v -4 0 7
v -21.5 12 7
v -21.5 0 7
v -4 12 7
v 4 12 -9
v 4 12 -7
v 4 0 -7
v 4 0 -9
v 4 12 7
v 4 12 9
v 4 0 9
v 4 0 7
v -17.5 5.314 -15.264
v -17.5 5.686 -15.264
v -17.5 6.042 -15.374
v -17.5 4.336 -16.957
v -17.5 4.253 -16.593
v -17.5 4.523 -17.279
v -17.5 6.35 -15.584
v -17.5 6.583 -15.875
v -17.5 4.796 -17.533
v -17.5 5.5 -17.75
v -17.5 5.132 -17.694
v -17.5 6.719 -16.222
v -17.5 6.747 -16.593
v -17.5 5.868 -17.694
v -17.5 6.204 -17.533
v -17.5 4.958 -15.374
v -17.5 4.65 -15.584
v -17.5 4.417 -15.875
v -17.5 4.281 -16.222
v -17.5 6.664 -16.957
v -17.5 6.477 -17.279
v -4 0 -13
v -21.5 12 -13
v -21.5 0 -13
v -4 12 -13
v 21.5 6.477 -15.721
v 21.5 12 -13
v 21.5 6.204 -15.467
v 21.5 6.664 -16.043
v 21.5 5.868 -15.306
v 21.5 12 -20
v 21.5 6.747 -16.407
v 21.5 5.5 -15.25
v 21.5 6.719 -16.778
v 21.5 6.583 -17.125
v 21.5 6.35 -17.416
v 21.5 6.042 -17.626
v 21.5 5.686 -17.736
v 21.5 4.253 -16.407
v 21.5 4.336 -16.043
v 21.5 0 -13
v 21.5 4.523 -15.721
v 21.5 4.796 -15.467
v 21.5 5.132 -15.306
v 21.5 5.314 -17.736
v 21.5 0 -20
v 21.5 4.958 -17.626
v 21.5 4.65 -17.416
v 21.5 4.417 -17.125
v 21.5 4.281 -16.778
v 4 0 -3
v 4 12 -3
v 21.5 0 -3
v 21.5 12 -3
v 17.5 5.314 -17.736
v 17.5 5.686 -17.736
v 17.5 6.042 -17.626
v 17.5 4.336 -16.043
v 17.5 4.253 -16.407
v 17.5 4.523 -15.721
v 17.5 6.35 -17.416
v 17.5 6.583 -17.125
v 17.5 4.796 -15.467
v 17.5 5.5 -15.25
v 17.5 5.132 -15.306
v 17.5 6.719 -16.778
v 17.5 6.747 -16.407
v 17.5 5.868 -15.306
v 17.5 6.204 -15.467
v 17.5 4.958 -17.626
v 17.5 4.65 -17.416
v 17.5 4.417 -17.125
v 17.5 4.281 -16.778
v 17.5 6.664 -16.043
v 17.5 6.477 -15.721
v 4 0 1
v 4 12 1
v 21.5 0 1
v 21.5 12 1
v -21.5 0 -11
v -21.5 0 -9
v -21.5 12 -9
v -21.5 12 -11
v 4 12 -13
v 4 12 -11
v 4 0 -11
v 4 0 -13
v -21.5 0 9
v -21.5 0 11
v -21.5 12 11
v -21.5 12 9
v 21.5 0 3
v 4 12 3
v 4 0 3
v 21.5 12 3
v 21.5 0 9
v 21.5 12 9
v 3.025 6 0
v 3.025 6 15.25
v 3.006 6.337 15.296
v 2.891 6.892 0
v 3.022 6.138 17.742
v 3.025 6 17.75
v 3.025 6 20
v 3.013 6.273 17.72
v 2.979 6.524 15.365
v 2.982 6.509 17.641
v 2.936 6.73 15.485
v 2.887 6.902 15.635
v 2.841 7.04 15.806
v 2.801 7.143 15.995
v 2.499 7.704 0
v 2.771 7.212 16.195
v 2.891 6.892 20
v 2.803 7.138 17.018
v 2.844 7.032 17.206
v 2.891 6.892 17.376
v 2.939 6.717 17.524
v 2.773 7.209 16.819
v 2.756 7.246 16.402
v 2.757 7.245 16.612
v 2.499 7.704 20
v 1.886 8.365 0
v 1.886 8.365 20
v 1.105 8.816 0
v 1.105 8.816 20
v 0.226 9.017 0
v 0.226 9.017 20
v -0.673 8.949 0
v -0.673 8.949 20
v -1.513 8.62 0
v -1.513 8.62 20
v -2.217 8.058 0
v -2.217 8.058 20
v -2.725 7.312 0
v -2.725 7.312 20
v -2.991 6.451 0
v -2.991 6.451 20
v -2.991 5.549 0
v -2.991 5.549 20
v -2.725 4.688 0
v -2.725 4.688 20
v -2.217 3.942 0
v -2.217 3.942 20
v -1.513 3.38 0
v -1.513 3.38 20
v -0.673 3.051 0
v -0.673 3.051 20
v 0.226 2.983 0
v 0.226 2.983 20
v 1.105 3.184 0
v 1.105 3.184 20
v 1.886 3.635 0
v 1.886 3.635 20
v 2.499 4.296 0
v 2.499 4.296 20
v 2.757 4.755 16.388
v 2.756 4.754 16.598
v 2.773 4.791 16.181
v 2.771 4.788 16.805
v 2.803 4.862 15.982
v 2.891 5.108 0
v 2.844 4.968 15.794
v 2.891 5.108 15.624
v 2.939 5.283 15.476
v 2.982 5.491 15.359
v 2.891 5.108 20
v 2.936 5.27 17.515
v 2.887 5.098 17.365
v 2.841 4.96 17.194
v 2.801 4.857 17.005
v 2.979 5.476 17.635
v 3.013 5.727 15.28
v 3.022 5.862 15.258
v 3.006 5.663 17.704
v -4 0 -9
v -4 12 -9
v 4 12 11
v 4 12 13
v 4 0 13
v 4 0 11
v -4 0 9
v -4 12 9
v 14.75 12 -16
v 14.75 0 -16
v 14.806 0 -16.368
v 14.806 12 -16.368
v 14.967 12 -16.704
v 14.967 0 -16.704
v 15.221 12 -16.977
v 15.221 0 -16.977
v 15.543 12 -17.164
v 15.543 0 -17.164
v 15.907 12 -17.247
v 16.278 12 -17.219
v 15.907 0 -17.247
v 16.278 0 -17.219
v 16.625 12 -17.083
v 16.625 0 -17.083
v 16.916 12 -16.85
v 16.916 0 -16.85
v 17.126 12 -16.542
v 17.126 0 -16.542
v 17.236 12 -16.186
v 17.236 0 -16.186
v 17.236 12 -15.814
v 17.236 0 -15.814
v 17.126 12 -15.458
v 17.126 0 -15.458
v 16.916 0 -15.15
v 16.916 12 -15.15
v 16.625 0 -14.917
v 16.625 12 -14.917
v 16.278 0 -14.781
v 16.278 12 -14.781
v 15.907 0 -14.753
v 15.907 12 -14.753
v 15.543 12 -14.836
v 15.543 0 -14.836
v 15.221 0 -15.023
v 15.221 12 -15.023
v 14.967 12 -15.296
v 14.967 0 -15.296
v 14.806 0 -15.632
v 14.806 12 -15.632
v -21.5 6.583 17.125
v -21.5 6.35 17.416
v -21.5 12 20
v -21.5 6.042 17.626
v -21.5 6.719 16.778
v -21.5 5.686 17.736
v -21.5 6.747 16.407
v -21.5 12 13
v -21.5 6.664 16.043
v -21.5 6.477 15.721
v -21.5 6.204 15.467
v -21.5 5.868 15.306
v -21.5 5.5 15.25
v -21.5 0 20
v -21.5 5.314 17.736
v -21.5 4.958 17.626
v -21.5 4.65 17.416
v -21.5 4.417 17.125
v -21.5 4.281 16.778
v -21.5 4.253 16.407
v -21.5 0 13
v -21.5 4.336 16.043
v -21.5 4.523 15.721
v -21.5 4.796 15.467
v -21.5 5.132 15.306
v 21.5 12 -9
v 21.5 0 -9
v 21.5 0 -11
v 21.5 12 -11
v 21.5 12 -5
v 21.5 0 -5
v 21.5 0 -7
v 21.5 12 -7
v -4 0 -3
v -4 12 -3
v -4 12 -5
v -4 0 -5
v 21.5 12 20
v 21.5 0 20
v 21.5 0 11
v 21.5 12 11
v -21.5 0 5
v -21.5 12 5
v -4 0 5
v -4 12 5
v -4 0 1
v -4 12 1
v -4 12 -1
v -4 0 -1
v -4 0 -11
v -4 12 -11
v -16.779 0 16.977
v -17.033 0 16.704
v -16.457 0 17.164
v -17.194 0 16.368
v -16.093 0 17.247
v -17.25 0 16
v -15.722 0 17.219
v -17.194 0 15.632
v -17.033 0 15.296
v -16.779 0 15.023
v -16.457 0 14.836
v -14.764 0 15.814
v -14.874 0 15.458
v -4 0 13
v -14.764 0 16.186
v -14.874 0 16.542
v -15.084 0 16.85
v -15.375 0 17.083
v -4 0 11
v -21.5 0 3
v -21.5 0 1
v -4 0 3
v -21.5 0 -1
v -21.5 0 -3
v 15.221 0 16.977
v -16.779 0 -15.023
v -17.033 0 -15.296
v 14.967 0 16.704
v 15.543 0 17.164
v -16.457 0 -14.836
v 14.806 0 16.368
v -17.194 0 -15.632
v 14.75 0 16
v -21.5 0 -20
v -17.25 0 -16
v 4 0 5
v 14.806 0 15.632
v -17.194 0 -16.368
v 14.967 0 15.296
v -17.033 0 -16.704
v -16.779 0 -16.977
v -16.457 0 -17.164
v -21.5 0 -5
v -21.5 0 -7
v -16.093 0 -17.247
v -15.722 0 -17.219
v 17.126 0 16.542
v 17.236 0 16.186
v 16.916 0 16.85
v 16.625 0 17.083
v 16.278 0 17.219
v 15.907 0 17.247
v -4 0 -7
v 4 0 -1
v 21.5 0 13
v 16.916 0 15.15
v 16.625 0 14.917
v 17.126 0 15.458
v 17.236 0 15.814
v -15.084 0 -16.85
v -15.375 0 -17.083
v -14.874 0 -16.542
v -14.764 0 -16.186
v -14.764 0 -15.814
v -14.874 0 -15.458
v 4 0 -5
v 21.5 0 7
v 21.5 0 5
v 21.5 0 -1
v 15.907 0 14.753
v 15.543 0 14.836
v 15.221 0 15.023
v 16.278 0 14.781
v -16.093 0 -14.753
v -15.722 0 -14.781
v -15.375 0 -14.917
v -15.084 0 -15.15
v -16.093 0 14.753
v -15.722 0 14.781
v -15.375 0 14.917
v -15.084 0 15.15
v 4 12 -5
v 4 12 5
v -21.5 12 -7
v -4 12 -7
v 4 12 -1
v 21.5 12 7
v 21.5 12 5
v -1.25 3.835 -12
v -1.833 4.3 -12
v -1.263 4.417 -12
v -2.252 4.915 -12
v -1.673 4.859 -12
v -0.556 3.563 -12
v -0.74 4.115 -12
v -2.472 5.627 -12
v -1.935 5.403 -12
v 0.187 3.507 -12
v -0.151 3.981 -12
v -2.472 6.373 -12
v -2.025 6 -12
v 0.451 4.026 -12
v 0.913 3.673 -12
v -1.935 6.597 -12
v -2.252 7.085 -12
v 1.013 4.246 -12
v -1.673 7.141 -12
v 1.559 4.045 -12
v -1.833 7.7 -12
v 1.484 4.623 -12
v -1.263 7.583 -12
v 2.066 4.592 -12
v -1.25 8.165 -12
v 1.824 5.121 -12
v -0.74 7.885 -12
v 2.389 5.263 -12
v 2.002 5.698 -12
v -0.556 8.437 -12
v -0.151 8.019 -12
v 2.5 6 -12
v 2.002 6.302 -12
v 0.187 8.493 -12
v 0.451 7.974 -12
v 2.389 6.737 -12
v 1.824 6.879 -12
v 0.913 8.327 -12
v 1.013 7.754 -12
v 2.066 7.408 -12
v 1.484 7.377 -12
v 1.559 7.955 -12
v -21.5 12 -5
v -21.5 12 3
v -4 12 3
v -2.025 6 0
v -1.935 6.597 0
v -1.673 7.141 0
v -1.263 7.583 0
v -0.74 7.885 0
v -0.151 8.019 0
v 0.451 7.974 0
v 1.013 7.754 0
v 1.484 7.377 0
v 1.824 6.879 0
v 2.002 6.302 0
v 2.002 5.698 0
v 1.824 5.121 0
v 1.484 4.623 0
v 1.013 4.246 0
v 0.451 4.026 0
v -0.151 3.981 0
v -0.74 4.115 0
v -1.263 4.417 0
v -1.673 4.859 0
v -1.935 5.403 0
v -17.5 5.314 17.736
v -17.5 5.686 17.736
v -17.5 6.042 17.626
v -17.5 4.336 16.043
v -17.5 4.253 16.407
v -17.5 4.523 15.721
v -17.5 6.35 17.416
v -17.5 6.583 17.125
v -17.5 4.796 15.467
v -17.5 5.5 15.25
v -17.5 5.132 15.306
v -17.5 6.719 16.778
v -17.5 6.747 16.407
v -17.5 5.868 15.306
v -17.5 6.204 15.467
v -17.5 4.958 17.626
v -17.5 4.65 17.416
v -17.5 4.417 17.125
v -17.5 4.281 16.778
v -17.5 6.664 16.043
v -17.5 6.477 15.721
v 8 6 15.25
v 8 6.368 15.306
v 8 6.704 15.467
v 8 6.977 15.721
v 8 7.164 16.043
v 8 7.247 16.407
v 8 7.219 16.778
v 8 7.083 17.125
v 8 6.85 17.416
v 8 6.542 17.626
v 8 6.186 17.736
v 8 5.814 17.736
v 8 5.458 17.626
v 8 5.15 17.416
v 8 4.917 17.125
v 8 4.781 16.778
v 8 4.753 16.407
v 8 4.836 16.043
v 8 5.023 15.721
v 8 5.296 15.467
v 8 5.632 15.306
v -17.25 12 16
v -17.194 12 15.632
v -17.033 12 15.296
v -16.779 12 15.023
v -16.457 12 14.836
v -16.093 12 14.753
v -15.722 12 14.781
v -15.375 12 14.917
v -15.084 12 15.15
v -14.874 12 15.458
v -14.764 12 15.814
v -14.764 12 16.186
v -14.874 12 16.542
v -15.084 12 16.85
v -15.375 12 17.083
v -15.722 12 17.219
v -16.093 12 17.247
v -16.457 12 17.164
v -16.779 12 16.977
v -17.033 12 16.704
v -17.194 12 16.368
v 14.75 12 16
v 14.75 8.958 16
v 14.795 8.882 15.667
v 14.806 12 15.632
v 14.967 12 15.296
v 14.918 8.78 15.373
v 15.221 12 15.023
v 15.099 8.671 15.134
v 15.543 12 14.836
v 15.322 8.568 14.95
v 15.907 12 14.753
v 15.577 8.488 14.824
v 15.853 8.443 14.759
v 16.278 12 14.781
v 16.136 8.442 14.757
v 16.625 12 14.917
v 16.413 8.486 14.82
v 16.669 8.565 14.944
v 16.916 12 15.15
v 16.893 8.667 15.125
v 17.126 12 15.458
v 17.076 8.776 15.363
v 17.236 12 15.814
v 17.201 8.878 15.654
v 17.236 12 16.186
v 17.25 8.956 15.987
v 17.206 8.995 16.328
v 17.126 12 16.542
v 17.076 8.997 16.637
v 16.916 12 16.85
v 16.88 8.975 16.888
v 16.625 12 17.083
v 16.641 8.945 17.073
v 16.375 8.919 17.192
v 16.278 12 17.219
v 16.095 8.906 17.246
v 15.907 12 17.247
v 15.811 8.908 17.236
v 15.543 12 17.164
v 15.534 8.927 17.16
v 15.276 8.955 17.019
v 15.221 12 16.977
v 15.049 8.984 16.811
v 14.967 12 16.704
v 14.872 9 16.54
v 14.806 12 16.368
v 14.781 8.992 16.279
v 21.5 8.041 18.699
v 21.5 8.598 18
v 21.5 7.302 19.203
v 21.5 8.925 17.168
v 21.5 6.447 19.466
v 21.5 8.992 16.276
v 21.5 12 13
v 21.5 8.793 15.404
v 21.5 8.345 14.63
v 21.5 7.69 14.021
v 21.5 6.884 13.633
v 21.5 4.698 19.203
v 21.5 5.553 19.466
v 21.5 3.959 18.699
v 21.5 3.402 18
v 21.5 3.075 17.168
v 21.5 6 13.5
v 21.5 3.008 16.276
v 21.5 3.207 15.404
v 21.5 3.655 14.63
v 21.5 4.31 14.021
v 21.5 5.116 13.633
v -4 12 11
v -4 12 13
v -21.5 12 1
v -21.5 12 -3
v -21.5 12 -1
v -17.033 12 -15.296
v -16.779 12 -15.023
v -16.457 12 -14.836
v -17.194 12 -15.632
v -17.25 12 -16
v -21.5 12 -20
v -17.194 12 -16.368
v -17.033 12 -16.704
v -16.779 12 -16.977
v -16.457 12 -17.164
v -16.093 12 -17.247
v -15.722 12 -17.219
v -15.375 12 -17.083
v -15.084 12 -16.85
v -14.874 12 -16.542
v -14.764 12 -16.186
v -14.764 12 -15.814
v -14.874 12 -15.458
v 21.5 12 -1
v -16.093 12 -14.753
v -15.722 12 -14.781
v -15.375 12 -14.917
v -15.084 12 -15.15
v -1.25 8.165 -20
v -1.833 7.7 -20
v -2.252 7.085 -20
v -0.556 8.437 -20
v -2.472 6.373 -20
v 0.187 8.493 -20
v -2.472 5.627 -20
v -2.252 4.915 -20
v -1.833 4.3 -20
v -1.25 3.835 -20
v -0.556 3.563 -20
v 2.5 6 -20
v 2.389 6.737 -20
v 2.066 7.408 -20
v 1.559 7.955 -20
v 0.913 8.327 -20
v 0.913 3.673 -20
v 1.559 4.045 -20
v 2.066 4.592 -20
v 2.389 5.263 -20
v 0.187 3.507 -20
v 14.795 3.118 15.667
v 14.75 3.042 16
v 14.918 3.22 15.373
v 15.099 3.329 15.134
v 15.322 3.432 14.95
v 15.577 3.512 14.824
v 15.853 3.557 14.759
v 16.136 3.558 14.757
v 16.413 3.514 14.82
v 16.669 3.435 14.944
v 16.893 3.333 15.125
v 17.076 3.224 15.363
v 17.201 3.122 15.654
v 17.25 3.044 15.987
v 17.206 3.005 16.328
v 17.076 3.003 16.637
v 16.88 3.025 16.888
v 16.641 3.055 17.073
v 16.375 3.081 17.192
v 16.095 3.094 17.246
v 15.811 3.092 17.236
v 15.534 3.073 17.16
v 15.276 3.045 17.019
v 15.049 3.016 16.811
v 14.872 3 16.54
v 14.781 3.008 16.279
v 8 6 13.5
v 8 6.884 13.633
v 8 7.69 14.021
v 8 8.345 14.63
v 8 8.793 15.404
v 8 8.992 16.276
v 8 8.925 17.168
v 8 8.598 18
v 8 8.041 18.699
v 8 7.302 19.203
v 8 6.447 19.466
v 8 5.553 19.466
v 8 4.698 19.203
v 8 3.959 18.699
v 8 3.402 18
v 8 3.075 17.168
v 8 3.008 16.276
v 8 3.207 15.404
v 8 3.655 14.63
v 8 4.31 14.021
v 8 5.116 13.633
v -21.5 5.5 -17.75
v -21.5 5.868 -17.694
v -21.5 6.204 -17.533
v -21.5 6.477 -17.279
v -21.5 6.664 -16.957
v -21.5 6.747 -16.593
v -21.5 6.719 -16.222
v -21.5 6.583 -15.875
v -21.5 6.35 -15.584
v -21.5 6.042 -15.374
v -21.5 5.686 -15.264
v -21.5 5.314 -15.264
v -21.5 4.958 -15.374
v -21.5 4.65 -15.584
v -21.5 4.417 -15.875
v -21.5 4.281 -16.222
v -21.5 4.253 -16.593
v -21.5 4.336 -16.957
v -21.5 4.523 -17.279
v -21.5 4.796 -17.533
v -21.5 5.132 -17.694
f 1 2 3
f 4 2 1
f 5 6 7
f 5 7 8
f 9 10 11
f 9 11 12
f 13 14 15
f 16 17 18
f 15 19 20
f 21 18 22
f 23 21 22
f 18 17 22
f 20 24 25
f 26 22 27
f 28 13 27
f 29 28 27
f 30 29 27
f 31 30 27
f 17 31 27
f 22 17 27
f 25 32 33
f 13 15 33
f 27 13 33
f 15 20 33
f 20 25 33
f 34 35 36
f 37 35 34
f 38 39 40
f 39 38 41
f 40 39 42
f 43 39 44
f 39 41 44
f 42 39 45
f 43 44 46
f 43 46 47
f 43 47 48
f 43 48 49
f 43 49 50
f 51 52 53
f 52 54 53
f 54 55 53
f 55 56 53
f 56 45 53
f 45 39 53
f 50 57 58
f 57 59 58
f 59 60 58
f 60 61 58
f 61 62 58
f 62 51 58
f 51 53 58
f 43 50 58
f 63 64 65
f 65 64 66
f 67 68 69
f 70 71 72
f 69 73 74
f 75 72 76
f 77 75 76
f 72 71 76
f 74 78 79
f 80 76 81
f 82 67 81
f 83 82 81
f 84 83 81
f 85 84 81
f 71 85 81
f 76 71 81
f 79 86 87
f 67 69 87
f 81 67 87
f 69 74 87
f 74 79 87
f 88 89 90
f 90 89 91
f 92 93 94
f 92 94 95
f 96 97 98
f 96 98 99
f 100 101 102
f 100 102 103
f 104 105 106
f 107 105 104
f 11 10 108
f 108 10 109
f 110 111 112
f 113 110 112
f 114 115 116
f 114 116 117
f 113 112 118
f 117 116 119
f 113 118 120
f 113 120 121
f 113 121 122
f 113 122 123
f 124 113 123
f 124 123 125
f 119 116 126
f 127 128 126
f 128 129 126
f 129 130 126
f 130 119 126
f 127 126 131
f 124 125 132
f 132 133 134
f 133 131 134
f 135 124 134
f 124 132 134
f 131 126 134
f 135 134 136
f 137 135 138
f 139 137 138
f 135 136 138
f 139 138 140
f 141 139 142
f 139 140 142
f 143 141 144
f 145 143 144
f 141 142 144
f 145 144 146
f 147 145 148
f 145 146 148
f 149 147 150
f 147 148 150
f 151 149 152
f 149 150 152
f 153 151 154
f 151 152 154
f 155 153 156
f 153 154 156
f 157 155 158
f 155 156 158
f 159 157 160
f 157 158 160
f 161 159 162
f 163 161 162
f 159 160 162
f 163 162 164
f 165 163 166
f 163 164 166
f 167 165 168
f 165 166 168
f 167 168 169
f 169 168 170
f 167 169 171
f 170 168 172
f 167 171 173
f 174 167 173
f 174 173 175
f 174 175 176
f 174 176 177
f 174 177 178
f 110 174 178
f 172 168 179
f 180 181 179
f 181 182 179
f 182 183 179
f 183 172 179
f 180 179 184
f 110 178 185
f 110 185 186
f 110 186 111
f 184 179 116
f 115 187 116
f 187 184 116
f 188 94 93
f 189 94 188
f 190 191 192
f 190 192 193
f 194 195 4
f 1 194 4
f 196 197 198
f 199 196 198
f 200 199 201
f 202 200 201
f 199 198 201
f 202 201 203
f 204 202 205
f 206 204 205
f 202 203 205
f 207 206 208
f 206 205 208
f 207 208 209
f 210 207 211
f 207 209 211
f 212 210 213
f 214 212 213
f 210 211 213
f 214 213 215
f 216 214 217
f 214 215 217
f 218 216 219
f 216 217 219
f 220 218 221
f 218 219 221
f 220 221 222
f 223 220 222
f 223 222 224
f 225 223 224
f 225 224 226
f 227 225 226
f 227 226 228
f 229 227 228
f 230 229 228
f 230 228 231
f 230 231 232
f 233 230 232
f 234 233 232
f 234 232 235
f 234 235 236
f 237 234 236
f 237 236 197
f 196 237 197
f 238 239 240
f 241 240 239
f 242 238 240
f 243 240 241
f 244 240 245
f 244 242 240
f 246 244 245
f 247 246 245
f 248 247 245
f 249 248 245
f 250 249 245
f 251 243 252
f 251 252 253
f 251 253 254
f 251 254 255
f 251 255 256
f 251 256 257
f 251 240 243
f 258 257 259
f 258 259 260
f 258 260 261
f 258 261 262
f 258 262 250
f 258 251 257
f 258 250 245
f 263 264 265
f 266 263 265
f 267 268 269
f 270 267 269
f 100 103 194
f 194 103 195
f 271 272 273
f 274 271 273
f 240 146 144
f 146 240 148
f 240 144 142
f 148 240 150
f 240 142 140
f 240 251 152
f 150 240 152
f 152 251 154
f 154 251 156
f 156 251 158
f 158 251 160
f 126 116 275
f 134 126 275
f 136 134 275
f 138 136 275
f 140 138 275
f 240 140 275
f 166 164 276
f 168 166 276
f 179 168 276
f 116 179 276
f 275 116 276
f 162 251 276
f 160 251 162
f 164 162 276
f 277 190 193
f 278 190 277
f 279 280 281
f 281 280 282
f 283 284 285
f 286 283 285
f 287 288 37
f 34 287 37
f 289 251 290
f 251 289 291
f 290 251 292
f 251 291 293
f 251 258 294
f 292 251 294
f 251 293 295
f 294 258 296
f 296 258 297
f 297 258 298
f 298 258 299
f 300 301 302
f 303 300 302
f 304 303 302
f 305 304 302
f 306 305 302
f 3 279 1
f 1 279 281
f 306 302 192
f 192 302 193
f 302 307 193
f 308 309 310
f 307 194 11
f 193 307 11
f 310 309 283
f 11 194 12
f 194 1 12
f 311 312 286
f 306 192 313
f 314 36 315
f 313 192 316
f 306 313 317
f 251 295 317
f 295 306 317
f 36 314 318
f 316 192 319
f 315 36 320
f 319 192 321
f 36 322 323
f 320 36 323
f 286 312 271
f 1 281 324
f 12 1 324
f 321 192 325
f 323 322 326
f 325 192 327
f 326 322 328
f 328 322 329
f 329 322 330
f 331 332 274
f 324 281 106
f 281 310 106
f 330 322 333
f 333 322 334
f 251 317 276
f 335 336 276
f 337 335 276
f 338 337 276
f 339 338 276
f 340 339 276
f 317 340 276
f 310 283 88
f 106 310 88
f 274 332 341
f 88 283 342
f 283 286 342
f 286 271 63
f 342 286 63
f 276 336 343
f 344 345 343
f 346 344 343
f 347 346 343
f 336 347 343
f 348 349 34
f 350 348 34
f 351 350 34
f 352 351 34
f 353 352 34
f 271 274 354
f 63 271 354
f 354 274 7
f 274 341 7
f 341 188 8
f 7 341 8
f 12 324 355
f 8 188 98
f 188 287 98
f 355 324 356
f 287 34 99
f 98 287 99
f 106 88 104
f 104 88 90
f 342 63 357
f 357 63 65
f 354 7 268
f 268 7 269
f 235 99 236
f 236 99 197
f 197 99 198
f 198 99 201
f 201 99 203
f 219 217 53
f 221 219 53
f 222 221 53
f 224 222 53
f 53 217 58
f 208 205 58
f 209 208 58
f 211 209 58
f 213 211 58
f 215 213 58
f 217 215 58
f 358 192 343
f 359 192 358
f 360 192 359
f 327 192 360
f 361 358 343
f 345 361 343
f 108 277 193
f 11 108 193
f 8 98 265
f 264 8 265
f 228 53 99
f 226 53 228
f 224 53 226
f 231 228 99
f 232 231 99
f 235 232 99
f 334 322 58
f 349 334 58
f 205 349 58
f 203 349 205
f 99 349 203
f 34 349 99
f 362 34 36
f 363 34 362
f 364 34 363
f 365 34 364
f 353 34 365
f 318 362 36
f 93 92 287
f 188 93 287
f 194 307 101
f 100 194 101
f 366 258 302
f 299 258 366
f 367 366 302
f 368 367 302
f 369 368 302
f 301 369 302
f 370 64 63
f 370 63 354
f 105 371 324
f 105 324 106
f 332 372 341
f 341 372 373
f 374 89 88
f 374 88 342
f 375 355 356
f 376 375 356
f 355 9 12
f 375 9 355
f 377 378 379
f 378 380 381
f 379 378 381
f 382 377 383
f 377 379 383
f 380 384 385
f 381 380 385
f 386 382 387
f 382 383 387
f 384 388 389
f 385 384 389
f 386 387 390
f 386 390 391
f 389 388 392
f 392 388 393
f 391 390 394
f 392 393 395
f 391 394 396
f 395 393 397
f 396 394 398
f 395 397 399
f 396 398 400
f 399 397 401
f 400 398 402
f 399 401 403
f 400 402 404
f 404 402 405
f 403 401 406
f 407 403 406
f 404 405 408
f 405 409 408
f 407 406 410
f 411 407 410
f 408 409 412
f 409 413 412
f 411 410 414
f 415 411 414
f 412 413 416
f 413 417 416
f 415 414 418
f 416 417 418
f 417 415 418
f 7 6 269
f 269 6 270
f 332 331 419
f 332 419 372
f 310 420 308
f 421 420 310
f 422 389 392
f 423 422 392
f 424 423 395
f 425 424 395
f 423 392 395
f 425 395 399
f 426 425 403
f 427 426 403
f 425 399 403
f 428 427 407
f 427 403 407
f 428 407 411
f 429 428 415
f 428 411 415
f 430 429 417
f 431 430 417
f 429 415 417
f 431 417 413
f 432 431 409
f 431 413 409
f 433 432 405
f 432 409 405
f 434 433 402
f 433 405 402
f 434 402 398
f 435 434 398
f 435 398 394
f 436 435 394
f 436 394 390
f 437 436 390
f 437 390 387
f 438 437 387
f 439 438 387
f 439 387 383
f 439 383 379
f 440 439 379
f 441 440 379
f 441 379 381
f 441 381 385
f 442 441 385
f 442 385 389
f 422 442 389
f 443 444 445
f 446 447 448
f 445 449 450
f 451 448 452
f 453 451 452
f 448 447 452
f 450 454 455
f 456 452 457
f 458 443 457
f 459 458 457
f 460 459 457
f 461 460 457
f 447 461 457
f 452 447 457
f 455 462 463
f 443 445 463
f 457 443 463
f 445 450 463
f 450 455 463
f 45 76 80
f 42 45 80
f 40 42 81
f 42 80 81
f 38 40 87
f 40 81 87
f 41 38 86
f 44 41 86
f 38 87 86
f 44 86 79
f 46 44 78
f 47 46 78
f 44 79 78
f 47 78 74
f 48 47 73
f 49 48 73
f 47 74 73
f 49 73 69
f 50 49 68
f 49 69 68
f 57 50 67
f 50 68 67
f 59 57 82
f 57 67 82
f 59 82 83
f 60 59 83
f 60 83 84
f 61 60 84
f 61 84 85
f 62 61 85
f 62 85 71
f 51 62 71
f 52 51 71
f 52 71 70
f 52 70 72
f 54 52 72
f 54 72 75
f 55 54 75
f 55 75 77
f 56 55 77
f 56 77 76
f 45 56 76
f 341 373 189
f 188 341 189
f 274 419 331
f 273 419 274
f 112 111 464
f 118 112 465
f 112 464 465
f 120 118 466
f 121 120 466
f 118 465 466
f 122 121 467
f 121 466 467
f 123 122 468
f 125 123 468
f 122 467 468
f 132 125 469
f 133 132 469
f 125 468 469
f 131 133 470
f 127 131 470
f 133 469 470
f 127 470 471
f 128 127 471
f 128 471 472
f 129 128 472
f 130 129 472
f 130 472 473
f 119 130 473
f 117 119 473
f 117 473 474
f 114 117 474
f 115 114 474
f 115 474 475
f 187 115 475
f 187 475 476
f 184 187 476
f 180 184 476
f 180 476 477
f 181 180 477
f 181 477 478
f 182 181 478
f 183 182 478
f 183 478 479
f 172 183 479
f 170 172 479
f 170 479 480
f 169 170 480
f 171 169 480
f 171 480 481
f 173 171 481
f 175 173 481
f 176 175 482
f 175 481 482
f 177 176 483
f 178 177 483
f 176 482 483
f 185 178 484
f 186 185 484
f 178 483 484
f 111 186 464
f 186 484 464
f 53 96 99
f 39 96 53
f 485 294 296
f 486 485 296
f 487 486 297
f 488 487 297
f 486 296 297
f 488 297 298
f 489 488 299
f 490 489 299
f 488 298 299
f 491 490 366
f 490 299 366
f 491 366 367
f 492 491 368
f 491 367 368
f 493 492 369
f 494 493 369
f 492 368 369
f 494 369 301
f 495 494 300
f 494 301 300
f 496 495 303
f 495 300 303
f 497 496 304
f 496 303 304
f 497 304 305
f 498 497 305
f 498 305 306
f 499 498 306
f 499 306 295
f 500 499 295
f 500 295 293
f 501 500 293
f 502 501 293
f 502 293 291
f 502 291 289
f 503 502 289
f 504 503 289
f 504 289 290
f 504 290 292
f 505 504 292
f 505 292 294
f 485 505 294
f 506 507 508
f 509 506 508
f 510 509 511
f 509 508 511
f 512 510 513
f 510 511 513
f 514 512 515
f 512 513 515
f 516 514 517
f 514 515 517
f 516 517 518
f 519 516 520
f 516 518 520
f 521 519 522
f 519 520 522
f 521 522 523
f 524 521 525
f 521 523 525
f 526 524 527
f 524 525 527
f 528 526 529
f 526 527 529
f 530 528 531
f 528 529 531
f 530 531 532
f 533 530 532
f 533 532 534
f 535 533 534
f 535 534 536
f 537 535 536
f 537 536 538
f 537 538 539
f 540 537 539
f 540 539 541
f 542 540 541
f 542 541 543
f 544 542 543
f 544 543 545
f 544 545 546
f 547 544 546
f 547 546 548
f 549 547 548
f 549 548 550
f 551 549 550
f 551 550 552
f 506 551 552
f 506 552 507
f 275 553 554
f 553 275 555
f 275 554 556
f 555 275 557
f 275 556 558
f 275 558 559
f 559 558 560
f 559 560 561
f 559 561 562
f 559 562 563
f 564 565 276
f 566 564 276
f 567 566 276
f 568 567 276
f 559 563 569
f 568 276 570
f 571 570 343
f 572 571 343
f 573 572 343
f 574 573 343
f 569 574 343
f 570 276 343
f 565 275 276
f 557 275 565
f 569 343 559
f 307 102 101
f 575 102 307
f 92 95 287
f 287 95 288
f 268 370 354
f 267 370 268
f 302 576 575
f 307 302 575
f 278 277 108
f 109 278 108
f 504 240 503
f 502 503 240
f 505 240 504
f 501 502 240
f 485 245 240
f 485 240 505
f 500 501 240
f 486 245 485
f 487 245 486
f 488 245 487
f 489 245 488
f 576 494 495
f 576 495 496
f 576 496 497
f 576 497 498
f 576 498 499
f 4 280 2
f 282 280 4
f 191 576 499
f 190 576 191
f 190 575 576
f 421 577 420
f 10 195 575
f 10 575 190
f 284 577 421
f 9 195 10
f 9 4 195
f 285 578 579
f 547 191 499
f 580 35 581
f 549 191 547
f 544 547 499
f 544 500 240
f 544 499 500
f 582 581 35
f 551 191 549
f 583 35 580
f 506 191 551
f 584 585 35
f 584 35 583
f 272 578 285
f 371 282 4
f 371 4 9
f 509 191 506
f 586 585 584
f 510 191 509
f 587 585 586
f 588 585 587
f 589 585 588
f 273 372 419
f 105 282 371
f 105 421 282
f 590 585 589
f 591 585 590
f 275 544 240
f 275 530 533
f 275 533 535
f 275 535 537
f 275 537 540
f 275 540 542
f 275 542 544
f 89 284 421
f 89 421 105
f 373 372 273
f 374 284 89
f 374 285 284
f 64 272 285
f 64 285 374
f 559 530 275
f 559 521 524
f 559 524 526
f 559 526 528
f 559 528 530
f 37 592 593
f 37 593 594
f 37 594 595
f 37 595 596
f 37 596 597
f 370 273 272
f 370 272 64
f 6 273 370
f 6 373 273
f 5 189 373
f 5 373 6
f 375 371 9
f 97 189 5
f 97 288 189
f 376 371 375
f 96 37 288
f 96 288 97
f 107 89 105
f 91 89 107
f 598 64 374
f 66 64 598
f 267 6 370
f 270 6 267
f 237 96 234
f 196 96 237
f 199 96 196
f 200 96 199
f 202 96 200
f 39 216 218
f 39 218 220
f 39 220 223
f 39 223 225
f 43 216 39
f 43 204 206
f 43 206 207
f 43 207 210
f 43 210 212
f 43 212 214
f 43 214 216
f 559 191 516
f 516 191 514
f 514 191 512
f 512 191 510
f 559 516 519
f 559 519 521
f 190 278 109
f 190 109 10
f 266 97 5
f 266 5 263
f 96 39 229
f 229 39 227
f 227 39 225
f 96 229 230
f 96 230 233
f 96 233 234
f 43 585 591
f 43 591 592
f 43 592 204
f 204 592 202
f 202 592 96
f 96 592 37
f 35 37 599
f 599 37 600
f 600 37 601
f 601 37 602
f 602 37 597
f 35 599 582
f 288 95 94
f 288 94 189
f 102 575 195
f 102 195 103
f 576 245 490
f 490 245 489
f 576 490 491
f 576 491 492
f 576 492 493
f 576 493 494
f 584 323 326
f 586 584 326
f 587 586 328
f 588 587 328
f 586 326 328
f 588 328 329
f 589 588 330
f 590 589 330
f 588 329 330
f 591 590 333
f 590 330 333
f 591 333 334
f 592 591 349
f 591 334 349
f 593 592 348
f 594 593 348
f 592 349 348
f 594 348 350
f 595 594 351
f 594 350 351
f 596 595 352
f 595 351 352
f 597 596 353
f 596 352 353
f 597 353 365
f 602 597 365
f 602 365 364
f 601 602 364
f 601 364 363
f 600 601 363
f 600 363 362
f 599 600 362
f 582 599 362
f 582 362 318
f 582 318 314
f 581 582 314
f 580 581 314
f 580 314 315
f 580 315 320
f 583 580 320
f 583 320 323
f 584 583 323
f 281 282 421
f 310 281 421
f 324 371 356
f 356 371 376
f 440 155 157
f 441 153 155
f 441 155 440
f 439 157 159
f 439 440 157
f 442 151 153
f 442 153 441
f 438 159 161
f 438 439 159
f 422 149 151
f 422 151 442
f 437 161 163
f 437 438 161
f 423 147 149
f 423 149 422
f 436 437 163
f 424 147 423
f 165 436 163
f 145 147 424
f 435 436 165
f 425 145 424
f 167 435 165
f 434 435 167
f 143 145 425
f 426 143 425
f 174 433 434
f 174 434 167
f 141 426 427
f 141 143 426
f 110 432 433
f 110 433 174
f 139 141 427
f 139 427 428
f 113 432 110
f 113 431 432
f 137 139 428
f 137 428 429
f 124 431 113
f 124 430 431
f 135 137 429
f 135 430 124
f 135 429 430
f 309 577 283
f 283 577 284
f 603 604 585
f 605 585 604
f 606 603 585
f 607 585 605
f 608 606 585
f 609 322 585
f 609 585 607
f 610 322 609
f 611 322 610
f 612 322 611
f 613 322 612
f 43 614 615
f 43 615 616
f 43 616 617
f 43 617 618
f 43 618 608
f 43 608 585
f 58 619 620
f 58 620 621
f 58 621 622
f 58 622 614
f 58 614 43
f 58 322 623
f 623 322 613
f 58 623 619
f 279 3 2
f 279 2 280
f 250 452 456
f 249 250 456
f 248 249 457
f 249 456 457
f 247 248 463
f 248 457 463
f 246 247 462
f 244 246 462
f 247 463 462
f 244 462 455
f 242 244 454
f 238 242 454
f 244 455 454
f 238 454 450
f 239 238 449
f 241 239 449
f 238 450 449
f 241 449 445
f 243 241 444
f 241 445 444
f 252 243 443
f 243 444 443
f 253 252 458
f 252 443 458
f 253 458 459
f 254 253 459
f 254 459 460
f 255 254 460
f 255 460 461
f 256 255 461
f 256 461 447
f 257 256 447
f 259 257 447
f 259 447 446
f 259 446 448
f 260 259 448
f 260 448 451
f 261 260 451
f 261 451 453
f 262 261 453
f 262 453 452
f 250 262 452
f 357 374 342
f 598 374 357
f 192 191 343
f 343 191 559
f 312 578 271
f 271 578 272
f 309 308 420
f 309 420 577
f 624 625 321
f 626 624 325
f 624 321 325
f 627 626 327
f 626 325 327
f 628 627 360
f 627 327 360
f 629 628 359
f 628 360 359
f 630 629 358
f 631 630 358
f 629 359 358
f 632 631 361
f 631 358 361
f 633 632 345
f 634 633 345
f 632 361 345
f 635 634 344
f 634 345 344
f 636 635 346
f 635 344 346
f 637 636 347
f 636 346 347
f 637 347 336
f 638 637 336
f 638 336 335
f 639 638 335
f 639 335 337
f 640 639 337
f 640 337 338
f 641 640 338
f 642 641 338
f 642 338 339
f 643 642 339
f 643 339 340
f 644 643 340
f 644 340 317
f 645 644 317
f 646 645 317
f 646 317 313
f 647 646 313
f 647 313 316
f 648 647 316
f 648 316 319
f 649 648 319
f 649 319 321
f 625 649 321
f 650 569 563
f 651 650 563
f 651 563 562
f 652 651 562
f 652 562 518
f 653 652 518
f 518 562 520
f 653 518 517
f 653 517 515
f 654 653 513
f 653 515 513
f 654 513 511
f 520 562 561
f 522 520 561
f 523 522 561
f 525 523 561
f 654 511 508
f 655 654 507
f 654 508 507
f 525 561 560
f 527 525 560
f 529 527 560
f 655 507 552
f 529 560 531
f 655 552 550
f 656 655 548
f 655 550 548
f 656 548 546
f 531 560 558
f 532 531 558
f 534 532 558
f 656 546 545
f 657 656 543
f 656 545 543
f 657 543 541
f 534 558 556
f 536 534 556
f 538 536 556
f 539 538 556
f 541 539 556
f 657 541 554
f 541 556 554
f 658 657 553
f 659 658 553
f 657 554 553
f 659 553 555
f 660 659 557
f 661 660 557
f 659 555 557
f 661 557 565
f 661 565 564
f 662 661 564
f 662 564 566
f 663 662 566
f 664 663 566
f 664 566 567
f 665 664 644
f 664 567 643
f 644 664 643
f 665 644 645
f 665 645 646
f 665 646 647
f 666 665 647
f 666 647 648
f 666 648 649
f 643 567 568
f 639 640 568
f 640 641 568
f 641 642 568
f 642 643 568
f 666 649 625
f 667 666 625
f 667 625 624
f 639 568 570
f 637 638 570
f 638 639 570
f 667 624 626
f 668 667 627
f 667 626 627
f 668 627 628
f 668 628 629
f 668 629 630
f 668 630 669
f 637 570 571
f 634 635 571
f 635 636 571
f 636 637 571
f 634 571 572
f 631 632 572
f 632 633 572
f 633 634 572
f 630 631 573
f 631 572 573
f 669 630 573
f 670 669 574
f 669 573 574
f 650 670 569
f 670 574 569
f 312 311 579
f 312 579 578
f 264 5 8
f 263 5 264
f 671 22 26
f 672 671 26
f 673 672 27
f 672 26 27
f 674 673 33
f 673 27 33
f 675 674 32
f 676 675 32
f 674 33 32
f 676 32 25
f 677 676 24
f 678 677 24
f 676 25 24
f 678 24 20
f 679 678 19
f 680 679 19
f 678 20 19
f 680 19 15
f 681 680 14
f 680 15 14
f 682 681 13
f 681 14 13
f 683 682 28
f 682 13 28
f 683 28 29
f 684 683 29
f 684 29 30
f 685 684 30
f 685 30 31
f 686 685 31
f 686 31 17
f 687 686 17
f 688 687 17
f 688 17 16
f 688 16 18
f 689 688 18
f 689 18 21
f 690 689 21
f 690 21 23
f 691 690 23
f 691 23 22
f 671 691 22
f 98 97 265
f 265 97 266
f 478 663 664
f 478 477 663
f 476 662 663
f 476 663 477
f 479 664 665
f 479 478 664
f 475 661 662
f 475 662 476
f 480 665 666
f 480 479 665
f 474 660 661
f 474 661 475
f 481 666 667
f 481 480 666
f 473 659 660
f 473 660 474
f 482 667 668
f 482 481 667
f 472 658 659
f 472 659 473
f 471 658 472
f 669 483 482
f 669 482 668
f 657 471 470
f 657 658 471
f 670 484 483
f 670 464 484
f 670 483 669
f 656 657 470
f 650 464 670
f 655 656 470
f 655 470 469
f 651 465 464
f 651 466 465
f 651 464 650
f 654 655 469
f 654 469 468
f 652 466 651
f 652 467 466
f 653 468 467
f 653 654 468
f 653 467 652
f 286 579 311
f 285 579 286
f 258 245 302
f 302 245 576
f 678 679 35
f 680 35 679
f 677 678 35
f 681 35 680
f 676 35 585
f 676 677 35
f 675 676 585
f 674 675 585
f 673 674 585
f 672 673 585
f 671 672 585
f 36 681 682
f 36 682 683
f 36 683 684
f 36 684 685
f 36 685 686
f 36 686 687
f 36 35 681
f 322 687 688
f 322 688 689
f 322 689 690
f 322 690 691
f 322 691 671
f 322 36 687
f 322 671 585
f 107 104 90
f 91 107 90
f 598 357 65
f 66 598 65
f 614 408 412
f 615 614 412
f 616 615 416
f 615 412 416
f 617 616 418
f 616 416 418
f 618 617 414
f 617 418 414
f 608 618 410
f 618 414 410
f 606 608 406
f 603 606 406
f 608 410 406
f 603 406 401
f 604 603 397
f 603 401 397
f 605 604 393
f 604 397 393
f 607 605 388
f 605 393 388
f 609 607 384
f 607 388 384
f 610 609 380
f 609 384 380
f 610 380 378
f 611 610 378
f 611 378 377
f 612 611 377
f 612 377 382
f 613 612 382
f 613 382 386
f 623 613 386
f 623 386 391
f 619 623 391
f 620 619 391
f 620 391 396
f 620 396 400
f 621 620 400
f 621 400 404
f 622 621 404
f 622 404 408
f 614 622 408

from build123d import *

# Parameters (mm, degrees)
SKETCH_1_W              = 43
SKETCH_1_H              = 40
EXTRUDE_1_DEPTH         = 2
SKETCH_3_W              = 43
SKETCH_3_H              = 40
EXTRUDE_3_DEPTH         = 10
SKETCH_4_R              = 3.025
CUT_EXTRUDE_1_DEPTH     = 20
CUT_EXTRUDE_2_REACH     = 48.971
SKETCH_5_R              = 2.025
HOLE_WIZARD_M6_1_D      = 5
HOLE_WIZARD_M6_1_DEPTH  = 8
SKETCH_8_W              = 17.5
SKETCH_8_H              = 2
CUT_EXTRUDE_3_DEPTH     = 12
HOLE_WIZARD_M3_1_D      = 2.5
HOLE_WIZARD_M3_2_D      = 2.5
HOLE_WIZARD_M3_2_DEPTH  = 4
HOLE_WIZARD_M3_3_D      = 2.5
HOLE_WIZARD_M3_3_DEPTH  = 4
SKETCH_16_R             = 3
CUT_EXTRUDE_4_DEPTH     = 13.5
HOLE_WIZARD_M3_4_REACH  = 39.607
HOLE_WIZARD_M3_4_BORE_R = 1.25


with BuildPart() as part:
    # 草图1 → 凸台-拉伸1 (new body)
    with BuildSketch(Plane(origin=(0, 0, 0), x_dir=(1, 0, 0), z_dir=(0, 1, 0))):
        Rectangle(SKETCH_1_W, SKETCH_1_H)
    extrude(amount=EXTRUDE_1_DEPTH)

    # 草图3 → 凸台-拉伸3 (add)
    with BuildSketch(Plane(origin=(0, 2, 0), x_dir=(1, 0, 0), z_dir=(0, 1, 0))):
        Rectangle(SKETCH_3_W, SKETCH_3_H)
    extrude(amount=EXTRUDE_3_DEPTH)

    # 草图4 → 切除-拉伸1 (cut)
    with BuildSketch(Plane.XY.offset(20)):
        with Locations((0, 6)):
            Circle(SKETCH_4_R)
    extrude(amount=-CUT_EXTRUDE_1_DEPTH, mode=Mode.SUBTRACT)

    # 草图5 → 切除-拉伸2 (cut, up to next)
    with BuildSketch(Plane(origin=(0, 0, -20), x_dir=(-1, 0, 0), z_dir=(0, 0, -1)), mode=Mode.PRIVATE) as cut_extrude_2_sk1:
        with Locations((0, 6)):
            Circle(SKETCH_5_R)
    cut_extrude_2_tool1 = extrude(cut_extrude_2_sk1.sketch, amount=-CUT_EXTRUDE_2_REACH, mode=Mode.PRIVATE) & part.part
    add(cut_extrude_2_tool1.solids().sort_by_distance((0, 6, -20))[0], mode=Mode.SUBTRACT)

    # M6 螺纹孔1
    with Locations(Plane(origin=(0, 0, -20), x_dir=(-1, 0, 0), z_dir=(0, 0, -1))):
        with Locations((0, 6)):
            Hole(HOLE_WIZARD_M6_1_D / 2, depth=HOLE_WIZARD_M6_1_DEPTH)

    # 草图8 → 切除-拉伸3 (cut)
    with BuildSketch(Plane(origin=(0, 12, 0), x_dir=(1, 0, 0), z_dir=(0, 1, 0))):
        with Locations((-12.75, -12)):
            Rectangle(SKETCH_8_W, SKETCH_8_H)
        with Locations((-12.75, -8)):
            Rectangle(SKETCH_8_W, SKETCH_8_H)
        with Locations((-12.75, -4)):
            Rectangle(SKETCH_8_W, SKETCH_8_H)
        with Locations((-12.75, 0)):
            Rectangle(SKETCH_8_W, SKETCH_8_H)
        with Locations((-12.75, 4)):
            Rectangle(SKETCH_8_W, SKETCH_8_H)
        with Locations((-12.75, 8)):
            Rectangle(SKETCH_8_W, SKETCH_8_H)
        with Locations((-12.75, 12)):
            Rectangle(SKETCH_8_W, SKETCH_8_H)
        with Locations((12.75, 12)):
            Rectangle(SKETCH_8_W, SKETCH_8_H)
        with Locations((12.75, 8)):
            Rectangle(SKETCH_8_W, SKETCH_8_H)
        with Locations((12.75, 4)):
            Rectangle(SKETCH_8_W, SKETCH_8_H)
        with Locations((12.75, 0)):
            Rectangle(SKETCH_8_W, SKETCH_8_H)
        with Locations((12.75, -4)):
            Rectangle(SKETCH_8_W, SKETCH_8_H)
        with Locations((12.75, -8)):
            Rectangle(SKETCH_8_W, SKETCH_8_H)
        with Locations((12.75, -12)):
            Rectangle(SKETCH_8_W, SKETCH_8_H)
    extrude(amount=-CUT_EXTRUDE_3_DEPTH, mode=Mode.SUBTRACT)

    # M3 螺纹孔1 (through all)
    with Locations(Plane(origin=(0, 12, 0), x_dir=(1, 0, 0), z_dir=(0, 1, 0))):
        with Locations((-16, 16), (16, 16), (-16, -16), (16, -16)):
            Hole(HOLE_WIZARD_M3_1_D / 2)

    # M3 螺纹孔2
    with Locations(Plane(origin=(21.5, 0, 0), x_dir=(0, 0, -1), z_dir=(1, 0, 0))):
        with Locations((16.5, 5.5)):
            Hole(HOLE_WIZARD_M3_2_D / 2, depth=HOLE_WIZARD_M3_2_DEPTH)

    # M3 螺纹孔3
    with Locations(Plane.ZY.offset(21.5)):
        with Locations((-16.5, 5.5), (16.5, 5.5)):
            Hole(HOLE_WIZARD_M3_3_D / 2, depth=HOLE_WIZARD_M3_3_DEPTH)

    # 草图16 → 切除-拉伸4 (cut)
    with BuildSketch(Plane(origin=(21.5, 0, 0), x_dir=(0, 0, -1), z_dir=(1, 0, 0))):
        with Locations((-16.5, 6)):
            Circle(SKETCH_16_R)
    extrude(amount=-CUT_EXTRUDE_4_DEPTH, mode=Mode.SUBTRACT)

    # M3 螺纹孔4 bore → M3 螺纹孔4 (cut, up to next)
    with BuildSketch(Plane(origin=(8, 0, 0), x_dir=(0, 0, -1), z_dir=(1, 0, 0)), mode=Mode.PRIVATE) as hole_wizard_m3_4_sk1:
        with Locations((-16.5, 6)):
            Circle(HOLE_WIZARD_M3_4_BORE_R)
    hole_wizard_m3_4_tool1 = extrude(hole_wizard_m3_4_sk1.sketch, amount=-HOLE_WIZARD_M3_4_REACH, mode=Mode.PRIVATE) & part.part
    add(hole_wizard_m3_4_tool1.solids().sort_by_distance((8, 6, 16.5))[0], mode=Mode.SUBTRACT)


solid = part.part
